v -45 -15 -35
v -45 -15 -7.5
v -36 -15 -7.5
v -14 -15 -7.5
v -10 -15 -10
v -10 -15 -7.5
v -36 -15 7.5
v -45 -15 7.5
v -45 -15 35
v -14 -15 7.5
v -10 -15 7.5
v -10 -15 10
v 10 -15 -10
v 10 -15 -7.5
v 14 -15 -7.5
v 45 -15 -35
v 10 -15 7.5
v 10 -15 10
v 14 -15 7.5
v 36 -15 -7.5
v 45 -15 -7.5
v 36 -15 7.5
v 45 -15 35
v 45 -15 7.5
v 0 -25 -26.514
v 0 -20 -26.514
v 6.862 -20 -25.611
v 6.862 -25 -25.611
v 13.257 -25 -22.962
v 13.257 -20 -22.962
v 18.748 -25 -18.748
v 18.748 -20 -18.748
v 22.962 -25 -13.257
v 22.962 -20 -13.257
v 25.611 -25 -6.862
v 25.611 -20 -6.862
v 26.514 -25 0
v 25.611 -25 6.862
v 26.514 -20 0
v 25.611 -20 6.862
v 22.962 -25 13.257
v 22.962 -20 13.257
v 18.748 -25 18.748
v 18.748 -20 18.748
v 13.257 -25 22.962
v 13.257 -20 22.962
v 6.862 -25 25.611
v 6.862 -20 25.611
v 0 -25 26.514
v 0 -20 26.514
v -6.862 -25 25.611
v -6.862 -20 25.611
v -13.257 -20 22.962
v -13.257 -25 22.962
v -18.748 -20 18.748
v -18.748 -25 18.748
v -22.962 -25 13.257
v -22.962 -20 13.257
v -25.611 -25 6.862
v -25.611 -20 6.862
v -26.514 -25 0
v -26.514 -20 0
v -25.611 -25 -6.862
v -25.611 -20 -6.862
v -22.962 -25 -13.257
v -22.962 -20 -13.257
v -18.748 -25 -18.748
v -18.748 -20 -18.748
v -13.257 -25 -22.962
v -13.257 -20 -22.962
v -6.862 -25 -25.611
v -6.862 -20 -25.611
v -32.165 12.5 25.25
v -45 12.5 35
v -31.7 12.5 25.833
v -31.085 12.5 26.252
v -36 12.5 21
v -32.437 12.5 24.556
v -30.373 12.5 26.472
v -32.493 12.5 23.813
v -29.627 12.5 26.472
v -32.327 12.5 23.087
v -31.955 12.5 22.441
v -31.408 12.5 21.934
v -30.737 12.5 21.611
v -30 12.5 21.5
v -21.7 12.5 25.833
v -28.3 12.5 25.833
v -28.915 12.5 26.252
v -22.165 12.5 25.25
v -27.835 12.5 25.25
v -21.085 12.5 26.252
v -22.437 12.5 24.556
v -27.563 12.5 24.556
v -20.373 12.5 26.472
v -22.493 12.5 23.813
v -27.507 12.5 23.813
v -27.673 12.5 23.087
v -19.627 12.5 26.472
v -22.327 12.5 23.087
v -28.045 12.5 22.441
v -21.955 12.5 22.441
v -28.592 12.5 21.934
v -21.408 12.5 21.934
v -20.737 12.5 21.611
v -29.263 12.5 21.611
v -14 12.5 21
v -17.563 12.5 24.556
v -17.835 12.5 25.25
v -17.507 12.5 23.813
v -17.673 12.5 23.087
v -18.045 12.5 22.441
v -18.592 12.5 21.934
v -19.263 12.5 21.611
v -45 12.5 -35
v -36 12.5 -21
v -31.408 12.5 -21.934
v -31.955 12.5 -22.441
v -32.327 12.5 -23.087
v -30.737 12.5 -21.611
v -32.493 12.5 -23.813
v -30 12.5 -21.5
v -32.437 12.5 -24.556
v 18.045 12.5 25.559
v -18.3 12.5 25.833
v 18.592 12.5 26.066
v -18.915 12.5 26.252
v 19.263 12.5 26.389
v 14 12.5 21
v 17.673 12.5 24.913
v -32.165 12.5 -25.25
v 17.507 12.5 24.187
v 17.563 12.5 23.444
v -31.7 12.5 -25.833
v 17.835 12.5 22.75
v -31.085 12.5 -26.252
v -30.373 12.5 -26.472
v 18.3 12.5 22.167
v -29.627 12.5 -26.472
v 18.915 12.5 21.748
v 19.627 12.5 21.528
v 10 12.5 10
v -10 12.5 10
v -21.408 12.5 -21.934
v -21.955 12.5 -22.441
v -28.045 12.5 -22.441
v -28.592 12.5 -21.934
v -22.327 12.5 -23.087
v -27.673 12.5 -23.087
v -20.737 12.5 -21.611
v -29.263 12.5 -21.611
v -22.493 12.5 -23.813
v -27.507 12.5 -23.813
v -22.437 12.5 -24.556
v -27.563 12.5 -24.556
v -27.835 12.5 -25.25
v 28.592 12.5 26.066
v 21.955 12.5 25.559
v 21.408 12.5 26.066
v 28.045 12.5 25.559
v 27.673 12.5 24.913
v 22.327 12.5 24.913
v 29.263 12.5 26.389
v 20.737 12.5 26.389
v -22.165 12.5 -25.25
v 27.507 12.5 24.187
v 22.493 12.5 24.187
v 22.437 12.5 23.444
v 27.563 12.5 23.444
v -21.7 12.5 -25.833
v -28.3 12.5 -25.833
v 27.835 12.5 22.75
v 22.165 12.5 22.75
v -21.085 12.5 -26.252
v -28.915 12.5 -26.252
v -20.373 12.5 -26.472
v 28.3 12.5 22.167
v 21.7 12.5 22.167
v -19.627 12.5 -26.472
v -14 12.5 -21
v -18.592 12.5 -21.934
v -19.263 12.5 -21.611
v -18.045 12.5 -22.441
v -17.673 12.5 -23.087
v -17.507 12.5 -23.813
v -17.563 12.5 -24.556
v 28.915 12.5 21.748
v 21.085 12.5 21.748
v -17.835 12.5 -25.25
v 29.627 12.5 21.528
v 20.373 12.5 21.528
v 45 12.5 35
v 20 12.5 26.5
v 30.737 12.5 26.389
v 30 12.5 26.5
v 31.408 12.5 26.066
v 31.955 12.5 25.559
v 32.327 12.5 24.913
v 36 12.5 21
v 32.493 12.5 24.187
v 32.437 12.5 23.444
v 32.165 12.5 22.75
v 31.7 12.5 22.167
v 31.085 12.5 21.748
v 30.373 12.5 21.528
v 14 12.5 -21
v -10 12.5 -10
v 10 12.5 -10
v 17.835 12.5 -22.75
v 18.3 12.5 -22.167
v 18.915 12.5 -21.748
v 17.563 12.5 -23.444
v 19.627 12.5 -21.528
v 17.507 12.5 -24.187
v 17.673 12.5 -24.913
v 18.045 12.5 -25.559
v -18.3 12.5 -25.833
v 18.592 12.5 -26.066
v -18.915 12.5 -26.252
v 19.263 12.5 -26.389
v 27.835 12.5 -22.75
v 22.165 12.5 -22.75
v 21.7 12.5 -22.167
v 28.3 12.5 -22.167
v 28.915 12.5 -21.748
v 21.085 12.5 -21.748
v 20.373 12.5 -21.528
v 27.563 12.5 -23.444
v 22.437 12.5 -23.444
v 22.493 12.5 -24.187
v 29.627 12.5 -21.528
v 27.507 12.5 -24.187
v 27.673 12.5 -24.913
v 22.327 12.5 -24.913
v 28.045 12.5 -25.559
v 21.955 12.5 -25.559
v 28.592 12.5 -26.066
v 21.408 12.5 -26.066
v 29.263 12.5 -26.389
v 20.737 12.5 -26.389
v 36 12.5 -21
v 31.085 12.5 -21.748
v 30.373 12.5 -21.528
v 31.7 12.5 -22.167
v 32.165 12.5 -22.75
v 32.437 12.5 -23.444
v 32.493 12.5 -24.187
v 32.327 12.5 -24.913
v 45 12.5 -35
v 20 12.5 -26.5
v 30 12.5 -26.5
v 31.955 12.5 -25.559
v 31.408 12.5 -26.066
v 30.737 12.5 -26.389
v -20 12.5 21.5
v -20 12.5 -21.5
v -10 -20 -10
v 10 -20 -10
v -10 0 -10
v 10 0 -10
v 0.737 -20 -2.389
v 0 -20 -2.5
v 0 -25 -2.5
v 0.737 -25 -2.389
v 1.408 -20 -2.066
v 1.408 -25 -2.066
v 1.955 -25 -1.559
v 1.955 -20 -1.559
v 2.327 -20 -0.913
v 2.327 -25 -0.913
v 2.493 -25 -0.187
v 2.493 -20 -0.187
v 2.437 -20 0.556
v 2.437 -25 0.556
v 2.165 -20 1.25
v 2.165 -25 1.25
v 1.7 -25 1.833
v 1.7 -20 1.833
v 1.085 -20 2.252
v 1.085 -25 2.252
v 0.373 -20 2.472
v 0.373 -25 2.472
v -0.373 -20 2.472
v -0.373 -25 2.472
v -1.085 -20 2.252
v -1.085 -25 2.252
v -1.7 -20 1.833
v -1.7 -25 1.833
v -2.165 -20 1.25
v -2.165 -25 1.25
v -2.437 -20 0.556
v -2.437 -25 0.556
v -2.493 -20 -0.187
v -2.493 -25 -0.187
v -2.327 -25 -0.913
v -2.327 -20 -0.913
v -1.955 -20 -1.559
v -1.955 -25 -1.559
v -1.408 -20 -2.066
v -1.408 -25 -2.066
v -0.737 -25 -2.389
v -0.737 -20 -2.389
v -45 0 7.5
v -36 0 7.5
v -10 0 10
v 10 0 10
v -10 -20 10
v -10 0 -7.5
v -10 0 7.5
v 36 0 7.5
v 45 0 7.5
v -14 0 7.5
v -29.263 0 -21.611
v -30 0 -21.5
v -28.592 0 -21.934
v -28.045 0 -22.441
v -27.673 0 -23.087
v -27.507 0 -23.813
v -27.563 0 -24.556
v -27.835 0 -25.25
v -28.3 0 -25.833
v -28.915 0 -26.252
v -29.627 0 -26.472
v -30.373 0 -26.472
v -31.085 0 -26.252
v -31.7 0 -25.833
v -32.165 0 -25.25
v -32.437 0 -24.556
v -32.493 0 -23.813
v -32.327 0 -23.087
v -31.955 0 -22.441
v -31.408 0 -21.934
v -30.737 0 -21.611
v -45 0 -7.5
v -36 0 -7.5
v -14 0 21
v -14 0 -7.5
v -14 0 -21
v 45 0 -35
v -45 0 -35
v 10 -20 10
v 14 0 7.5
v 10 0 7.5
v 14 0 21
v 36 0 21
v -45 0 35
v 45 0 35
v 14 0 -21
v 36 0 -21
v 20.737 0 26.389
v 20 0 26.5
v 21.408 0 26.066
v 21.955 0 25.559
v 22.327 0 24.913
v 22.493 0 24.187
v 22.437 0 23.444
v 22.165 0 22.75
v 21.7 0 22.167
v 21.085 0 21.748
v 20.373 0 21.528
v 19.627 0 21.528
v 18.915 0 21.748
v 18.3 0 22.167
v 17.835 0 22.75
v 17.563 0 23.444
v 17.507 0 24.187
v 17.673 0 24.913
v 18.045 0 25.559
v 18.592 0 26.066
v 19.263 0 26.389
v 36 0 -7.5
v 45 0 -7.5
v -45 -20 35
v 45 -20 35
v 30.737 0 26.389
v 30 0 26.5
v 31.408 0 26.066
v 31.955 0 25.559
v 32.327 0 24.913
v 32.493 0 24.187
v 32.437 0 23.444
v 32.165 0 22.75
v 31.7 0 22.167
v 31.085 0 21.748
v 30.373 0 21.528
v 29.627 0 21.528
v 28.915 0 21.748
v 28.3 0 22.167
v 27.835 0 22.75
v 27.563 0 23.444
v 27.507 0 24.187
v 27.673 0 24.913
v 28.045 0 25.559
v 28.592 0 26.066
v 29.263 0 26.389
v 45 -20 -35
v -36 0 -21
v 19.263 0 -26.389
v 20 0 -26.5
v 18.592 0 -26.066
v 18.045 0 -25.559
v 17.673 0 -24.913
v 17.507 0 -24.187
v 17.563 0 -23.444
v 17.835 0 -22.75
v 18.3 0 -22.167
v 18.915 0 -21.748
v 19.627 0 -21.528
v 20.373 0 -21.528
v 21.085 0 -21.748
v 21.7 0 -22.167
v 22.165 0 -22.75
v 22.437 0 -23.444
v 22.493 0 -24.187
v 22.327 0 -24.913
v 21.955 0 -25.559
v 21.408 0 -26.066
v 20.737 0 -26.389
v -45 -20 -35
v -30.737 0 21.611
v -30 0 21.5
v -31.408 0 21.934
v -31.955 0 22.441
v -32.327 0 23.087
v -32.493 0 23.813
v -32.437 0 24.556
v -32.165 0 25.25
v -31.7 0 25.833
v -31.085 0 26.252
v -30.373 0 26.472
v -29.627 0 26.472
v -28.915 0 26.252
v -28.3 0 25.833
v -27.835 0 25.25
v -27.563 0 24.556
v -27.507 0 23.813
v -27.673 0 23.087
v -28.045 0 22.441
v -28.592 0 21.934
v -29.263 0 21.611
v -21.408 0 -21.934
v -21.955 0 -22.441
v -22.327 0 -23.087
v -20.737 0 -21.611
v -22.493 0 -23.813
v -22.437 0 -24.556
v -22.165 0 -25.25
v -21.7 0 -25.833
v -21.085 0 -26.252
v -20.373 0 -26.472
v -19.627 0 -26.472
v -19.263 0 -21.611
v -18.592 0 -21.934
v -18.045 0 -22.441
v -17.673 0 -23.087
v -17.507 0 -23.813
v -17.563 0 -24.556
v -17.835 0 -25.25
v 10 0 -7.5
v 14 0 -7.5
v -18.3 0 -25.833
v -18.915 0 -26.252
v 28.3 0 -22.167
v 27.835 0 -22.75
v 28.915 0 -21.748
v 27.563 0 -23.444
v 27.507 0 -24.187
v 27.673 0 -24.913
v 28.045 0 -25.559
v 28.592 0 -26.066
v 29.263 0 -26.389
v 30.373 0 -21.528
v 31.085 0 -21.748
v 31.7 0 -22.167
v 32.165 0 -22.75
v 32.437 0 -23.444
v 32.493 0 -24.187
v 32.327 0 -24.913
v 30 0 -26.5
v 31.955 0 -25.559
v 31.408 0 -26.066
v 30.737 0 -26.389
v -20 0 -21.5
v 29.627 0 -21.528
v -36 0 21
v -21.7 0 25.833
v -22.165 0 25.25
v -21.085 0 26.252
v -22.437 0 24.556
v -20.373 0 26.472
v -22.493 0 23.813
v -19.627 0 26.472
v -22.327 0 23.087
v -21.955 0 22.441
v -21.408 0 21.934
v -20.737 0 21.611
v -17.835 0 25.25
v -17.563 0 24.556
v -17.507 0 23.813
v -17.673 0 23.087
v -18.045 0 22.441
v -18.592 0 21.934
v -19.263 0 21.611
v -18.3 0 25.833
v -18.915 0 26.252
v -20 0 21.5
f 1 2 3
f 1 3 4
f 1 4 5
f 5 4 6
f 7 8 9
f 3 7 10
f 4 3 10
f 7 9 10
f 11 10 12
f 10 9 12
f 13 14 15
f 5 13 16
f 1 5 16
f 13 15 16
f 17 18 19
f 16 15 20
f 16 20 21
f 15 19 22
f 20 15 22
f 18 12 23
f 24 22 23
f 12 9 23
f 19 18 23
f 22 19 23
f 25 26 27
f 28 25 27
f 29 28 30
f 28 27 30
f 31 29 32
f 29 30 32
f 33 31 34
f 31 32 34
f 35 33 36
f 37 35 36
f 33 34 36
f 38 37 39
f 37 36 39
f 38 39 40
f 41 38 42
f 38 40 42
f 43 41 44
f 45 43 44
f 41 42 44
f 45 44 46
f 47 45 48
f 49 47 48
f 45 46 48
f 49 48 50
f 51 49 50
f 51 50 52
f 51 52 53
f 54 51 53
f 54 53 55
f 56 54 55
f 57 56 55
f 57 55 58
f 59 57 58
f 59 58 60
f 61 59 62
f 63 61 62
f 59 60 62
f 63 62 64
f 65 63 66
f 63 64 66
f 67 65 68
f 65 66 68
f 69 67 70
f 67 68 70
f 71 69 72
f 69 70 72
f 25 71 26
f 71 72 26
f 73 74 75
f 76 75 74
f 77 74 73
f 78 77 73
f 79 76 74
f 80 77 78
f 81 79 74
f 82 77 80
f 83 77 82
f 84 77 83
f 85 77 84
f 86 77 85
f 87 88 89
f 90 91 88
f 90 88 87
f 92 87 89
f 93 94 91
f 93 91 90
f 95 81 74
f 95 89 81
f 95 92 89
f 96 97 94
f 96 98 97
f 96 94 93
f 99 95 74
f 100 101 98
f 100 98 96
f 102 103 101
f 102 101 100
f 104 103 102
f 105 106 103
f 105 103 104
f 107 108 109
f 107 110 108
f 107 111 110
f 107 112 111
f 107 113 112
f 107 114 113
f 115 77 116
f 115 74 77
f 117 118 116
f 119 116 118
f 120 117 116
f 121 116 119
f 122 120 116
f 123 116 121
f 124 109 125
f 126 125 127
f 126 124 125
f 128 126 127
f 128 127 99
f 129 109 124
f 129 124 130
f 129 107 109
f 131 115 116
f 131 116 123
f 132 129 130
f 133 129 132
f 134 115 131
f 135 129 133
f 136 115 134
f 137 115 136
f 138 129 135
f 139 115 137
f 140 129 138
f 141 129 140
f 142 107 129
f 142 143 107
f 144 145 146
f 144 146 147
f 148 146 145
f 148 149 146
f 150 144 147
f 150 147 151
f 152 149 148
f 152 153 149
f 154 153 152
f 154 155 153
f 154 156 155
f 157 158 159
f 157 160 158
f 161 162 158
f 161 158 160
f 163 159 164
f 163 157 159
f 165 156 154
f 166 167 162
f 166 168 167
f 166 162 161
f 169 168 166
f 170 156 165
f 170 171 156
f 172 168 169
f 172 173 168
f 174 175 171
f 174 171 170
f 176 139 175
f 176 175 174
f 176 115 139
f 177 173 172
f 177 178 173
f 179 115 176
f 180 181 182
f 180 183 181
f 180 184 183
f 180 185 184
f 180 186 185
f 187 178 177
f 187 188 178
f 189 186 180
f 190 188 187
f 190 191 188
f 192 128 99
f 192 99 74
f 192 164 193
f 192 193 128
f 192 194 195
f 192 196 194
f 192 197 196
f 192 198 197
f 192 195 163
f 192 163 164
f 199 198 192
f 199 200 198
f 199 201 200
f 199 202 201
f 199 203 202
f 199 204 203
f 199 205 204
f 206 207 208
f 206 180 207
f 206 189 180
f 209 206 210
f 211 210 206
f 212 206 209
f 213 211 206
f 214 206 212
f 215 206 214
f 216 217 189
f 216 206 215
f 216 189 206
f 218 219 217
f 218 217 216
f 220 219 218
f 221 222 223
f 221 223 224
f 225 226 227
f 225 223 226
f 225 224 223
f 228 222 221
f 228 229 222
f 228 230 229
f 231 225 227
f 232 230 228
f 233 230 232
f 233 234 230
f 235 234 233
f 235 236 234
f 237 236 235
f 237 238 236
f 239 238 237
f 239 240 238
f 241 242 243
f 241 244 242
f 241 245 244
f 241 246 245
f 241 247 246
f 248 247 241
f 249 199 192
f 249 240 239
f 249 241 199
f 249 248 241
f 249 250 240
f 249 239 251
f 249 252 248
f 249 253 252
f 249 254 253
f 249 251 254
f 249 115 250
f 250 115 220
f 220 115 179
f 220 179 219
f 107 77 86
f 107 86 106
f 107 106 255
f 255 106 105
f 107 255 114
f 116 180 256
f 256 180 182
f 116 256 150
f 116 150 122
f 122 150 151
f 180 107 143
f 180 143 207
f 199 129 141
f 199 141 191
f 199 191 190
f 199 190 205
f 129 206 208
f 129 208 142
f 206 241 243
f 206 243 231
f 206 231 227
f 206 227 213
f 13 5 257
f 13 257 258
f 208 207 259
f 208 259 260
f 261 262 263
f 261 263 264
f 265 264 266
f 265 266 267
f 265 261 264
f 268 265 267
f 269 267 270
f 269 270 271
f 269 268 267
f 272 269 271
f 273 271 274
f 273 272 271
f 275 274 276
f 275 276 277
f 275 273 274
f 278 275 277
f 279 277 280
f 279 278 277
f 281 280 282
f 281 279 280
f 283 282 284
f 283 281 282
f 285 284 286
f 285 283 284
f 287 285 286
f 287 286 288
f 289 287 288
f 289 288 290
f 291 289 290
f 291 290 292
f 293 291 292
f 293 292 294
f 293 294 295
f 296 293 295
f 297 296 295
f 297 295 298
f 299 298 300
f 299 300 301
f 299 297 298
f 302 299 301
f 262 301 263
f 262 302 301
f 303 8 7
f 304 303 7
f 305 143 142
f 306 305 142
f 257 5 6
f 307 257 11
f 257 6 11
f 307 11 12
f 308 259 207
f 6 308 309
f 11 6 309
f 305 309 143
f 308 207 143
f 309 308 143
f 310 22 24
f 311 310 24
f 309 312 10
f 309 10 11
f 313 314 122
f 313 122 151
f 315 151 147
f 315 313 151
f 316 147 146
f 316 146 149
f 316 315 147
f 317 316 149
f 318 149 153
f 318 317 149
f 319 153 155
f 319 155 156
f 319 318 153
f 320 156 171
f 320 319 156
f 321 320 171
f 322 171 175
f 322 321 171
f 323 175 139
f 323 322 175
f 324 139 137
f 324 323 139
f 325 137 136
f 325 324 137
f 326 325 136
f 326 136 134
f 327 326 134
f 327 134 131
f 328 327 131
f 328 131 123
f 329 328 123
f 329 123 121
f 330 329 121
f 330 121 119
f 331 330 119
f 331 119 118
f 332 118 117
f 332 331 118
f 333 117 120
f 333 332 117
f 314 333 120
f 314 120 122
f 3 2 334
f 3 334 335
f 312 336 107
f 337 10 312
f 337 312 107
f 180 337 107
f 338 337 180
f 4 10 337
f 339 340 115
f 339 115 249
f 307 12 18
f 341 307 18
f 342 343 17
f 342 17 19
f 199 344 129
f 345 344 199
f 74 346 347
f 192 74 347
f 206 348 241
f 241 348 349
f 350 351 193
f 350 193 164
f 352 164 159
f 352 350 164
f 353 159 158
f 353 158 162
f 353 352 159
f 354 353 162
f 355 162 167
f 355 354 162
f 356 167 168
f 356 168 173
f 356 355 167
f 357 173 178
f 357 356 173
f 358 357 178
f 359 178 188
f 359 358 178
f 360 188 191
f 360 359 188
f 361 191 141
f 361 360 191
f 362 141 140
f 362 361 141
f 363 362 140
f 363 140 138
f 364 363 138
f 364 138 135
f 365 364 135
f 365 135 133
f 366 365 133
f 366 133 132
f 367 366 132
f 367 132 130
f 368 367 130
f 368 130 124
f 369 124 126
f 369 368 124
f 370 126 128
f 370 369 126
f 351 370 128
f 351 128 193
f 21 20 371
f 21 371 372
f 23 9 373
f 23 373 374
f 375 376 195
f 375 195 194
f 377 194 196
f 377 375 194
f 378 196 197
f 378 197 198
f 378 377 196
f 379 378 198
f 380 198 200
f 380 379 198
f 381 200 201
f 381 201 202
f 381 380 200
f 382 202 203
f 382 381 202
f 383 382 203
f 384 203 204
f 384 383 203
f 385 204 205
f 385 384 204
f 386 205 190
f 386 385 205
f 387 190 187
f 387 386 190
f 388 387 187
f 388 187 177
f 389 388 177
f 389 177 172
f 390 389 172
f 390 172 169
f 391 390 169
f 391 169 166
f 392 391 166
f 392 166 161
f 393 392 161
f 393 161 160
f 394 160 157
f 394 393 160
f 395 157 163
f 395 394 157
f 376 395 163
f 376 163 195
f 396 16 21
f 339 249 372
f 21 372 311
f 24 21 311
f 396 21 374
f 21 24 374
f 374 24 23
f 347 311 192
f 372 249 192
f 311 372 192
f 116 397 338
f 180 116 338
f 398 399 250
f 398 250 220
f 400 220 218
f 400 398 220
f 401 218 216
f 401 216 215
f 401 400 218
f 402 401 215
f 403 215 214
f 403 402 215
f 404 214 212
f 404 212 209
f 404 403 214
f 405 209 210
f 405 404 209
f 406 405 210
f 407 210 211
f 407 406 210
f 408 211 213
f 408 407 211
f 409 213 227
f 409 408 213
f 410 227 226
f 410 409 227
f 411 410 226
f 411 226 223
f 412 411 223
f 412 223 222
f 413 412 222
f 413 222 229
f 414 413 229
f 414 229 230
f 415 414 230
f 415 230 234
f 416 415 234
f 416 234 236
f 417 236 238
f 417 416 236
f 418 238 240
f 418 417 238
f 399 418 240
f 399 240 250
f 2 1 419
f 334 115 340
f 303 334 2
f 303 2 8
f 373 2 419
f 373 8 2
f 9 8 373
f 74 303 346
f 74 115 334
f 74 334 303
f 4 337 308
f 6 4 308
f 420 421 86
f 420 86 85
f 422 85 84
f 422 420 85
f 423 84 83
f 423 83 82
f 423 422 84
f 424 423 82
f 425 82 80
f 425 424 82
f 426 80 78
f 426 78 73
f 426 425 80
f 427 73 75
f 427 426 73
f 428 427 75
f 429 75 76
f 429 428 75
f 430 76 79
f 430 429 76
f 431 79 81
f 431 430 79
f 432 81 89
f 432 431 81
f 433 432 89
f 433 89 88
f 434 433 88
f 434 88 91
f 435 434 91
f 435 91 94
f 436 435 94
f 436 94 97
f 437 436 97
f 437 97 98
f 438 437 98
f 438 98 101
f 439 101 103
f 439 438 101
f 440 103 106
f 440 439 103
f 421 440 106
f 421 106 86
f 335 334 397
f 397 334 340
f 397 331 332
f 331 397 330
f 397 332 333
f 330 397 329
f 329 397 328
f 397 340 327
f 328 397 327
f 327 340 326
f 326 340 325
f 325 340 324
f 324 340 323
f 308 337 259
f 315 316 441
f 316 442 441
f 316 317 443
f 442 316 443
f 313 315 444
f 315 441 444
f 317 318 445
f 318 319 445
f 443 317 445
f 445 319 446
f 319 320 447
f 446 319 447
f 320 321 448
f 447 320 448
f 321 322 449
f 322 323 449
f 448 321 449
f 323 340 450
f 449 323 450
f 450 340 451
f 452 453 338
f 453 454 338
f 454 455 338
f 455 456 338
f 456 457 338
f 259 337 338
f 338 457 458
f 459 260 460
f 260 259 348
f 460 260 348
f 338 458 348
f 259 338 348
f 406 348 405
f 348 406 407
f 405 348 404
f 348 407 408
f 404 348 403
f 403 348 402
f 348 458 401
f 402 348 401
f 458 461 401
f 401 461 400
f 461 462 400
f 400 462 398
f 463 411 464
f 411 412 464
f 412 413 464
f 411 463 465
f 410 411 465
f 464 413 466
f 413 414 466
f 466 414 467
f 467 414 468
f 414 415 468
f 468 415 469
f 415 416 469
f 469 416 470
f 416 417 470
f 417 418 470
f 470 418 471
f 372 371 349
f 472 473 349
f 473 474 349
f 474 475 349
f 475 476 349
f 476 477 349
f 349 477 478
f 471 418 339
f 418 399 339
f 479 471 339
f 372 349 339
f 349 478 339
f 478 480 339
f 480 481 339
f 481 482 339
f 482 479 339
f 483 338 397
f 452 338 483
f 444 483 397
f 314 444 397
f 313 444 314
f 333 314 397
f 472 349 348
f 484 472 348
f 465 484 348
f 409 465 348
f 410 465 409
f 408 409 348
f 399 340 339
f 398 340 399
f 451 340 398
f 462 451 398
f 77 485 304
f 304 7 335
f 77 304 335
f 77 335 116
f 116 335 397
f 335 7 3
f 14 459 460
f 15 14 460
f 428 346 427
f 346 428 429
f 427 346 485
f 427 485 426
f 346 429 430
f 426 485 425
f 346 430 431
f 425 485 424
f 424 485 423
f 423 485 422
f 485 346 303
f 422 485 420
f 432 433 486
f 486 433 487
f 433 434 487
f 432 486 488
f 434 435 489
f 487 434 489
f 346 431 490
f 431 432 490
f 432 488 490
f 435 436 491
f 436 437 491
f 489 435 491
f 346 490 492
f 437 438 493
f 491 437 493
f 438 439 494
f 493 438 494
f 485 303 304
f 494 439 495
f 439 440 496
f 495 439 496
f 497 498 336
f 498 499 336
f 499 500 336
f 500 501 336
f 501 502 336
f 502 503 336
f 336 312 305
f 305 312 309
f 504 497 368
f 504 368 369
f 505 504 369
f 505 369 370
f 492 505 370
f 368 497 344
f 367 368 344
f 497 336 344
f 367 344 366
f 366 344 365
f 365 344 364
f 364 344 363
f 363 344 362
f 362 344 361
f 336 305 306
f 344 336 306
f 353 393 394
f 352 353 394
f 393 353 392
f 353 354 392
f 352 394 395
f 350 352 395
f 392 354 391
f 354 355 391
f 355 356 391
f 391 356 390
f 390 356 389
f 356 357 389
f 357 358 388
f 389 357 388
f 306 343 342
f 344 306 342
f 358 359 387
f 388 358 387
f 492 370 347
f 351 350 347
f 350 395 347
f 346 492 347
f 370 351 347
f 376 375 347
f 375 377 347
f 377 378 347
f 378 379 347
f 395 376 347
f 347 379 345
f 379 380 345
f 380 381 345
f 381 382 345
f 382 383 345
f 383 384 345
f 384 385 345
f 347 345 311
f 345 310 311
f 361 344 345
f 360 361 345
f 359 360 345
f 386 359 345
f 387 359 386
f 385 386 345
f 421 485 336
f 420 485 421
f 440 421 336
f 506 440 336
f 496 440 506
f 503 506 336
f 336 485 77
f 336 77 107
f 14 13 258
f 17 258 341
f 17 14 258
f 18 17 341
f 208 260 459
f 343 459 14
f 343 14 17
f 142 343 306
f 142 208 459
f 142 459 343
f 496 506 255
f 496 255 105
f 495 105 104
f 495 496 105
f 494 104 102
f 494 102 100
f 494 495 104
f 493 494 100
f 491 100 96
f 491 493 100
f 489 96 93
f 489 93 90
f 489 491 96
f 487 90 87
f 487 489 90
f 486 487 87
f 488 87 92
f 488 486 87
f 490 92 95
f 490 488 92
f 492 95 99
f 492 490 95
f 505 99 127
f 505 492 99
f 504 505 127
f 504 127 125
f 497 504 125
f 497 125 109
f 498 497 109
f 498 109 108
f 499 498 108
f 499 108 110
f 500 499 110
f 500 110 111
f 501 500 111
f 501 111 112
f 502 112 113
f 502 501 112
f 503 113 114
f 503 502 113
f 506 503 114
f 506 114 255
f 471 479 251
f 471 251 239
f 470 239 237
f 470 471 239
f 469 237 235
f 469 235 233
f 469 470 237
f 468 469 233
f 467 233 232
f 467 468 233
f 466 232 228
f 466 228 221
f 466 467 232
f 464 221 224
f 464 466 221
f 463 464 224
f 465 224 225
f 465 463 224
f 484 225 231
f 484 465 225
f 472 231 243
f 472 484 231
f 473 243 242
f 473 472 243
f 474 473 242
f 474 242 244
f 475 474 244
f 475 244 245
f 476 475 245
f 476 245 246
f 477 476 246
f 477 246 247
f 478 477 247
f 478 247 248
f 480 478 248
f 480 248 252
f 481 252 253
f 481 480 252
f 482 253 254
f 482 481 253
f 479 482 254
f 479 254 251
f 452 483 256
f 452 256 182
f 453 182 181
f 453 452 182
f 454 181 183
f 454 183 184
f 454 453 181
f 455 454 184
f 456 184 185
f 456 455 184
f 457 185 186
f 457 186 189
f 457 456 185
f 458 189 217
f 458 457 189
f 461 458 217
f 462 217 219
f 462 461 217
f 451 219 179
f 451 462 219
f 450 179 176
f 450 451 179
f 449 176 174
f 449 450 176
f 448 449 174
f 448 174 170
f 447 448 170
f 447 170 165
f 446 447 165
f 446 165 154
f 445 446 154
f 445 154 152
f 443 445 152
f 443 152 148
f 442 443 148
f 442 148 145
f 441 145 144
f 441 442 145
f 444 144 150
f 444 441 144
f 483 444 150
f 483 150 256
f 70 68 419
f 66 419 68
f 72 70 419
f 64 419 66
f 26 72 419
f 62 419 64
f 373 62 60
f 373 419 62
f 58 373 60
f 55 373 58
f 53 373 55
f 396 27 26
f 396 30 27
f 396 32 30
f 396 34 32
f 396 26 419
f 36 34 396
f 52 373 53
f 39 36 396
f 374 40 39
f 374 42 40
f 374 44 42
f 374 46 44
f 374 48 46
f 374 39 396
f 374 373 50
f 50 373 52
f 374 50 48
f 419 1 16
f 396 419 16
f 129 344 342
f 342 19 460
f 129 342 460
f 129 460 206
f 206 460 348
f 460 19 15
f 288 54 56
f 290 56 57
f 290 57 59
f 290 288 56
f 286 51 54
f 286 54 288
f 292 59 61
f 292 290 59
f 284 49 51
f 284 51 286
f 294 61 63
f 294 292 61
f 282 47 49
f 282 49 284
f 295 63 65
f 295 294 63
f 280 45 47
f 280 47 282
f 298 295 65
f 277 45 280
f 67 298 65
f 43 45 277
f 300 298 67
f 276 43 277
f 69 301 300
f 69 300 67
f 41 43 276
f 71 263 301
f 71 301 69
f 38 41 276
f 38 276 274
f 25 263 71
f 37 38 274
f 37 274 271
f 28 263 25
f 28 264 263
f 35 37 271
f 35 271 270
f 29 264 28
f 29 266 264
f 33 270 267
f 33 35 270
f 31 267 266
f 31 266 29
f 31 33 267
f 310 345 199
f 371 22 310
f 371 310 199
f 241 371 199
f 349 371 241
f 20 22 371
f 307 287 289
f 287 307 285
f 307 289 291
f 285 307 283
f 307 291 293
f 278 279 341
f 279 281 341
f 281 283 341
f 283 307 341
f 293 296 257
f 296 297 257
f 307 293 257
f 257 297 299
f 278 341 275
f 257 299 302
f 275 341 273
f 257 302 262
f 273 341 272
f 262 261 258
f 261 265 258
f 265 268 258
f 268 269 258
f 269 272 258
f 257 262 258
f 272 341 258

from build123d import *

# Parameters (mm, degrees)
SKETCH1_W           = 90
SKETCH1_H           = 70
SKETCH1_R           = 2.5
SKETCH1_W_2         = 22
SKETCH1_H_2         = 42
BOSS_EXTRUDE1_DEPTH = 12.5
SKETCH3_W           = 9
SKETCH3_H           = 15
SKETCH3_W_2         = 28
BOSS_EXTRUDE2_DEPTH = 15
SKETCH4_W           = 20
SKETCH4_H           = 20
CUT_EXTRUDE1_DEPTH  = 64.294944506
SKETCH7_W           = 90
SKETCH7_H           = 70
SKETCH7_W_2         = 20
SKETCH7_H_2         = 20
BOSS_EXTRUDE3_DEPTH = 5
SKETCH8_R           = 26.514354508
SKETCH8_R_2         = 2.5
BOSS_EXTRUDE4_DEPTH = 5


with BuildPart() as part:
    # Sketch1 → Boss-Extrude1 (new body)
    with BuildSketch(Plane(origin=(0, 0, 0), x_dir=(1, 0, 0), z_dir=(0, 1, 0))):
        Rectangle(SKETCH1_W, SKETCH1_H)
        with Locations(Location((-30, 24, 0), (0, 0, 270))):
            Circle(SKETCH1_R, mode=Mode.SUBTRACT)
        with Locations(Location((-20, 24, 0), (0, 0, 270))):
            Circle(SKETCH1_R, mode=Mode.SUBTRACT)
        with Locations(Location((-20, -24, 0), (0, 0, 90))):
            Circle(SKETCH1_R, mode=Mode.SUBTRACT)
        with Locations(Location((-30, -24, 0), (0, 0, 90))):
            Circle(SKETCH1_R, mode=Mode.SUBTRACT)
        with Locations(Location((20, -24, 0), (0, 0, 270))):
            Circle(SKETCH1_R, mode=Mode.SUBTRACT)
        with Locations(Location((30, -24, 0), (0, 0, 270))):
            Circle(SKETCH1_R, mode=Mode.SUBTRACT)
        with Locations(Location((20, 24, 0), (0, 0, 90))):
            Circle(SKETCH1_R, mode=Mode.SUBTRACT)
        with Locations(Location((30, 24, 0), (0, 0, 90))):
            Circle(SKETCH1_R, mode=Mode.SUBTRACT)
        with Locations((-25, 0)):
            Rectangle(SKETCH1_W_2, SKETCH1_H_2, mode=Mode.SUBTRACT)
        with Locations((25, 0)):
            Rectangle(SKETCH1_W_2, SKETCH1_H_2, mode=Mode.SUBTRACT)
    extrude(amount=BOSS_EXTRUDE1_DEPTH)

    # Sketch3 → Boss-Extrude2 (add)
    with BuildSketch(Plane.XZ):
        with Locations((-40.5, 0)):
            Rectangle(SKETCH3_W, SKETCH3_H)
        Rectangle(SKETCH3_W_2, SKETCH3_H)
        with Locations((40.5, 0)):
            Rectangle(SKETCH3_W, SKETCH3_H)
    extrude(amount=BOSS_EXTRUDE2_DEPTH)

    # Sketch4 → Cut-Extrude1 (cut, through all)
    with BuildSketch(Plane(origin=(0, 12.5, 0), x_dir=(1, 0, 0), z_dir=(0, 1, 0))):
        Rectangle(SKETCH4_W, SKETCH4_H)
    extrude(amount=-CUT_EXTRUDE1_DEPTH, mode=Mode.SUBTRACT)

    # Sketch7 → Boss-Extrude3 (add)
    with BuildSketch(Plane.XZ.offset(15)):
        Rectangle(SKETCH7_W, SKETCH7_H)
        Rectangle(SKETCH7_W_2, SKETCH7_H_2, mode=Mode.SUBTRACT)
    extrude(amount=BOSS_EXTRUDE3_DEPTH)

    # Sketch8 → Boss-Extrude4 (add)
    with BuildSketch(Plane.XZ.offset(20)):
        with Locations(Location((0, 0, 0), (0, 0, 270))):
            Circle(SKETCH8_R)
        with Locations(Location((0, 0, 0), (0, 0, 270))):
            Circle(SKETCH8_R_2, mode=Mode.SUBTRACT)
    extrude(amount=BOSS_EXTRUDE4_DEPTH)


solid = part.part
